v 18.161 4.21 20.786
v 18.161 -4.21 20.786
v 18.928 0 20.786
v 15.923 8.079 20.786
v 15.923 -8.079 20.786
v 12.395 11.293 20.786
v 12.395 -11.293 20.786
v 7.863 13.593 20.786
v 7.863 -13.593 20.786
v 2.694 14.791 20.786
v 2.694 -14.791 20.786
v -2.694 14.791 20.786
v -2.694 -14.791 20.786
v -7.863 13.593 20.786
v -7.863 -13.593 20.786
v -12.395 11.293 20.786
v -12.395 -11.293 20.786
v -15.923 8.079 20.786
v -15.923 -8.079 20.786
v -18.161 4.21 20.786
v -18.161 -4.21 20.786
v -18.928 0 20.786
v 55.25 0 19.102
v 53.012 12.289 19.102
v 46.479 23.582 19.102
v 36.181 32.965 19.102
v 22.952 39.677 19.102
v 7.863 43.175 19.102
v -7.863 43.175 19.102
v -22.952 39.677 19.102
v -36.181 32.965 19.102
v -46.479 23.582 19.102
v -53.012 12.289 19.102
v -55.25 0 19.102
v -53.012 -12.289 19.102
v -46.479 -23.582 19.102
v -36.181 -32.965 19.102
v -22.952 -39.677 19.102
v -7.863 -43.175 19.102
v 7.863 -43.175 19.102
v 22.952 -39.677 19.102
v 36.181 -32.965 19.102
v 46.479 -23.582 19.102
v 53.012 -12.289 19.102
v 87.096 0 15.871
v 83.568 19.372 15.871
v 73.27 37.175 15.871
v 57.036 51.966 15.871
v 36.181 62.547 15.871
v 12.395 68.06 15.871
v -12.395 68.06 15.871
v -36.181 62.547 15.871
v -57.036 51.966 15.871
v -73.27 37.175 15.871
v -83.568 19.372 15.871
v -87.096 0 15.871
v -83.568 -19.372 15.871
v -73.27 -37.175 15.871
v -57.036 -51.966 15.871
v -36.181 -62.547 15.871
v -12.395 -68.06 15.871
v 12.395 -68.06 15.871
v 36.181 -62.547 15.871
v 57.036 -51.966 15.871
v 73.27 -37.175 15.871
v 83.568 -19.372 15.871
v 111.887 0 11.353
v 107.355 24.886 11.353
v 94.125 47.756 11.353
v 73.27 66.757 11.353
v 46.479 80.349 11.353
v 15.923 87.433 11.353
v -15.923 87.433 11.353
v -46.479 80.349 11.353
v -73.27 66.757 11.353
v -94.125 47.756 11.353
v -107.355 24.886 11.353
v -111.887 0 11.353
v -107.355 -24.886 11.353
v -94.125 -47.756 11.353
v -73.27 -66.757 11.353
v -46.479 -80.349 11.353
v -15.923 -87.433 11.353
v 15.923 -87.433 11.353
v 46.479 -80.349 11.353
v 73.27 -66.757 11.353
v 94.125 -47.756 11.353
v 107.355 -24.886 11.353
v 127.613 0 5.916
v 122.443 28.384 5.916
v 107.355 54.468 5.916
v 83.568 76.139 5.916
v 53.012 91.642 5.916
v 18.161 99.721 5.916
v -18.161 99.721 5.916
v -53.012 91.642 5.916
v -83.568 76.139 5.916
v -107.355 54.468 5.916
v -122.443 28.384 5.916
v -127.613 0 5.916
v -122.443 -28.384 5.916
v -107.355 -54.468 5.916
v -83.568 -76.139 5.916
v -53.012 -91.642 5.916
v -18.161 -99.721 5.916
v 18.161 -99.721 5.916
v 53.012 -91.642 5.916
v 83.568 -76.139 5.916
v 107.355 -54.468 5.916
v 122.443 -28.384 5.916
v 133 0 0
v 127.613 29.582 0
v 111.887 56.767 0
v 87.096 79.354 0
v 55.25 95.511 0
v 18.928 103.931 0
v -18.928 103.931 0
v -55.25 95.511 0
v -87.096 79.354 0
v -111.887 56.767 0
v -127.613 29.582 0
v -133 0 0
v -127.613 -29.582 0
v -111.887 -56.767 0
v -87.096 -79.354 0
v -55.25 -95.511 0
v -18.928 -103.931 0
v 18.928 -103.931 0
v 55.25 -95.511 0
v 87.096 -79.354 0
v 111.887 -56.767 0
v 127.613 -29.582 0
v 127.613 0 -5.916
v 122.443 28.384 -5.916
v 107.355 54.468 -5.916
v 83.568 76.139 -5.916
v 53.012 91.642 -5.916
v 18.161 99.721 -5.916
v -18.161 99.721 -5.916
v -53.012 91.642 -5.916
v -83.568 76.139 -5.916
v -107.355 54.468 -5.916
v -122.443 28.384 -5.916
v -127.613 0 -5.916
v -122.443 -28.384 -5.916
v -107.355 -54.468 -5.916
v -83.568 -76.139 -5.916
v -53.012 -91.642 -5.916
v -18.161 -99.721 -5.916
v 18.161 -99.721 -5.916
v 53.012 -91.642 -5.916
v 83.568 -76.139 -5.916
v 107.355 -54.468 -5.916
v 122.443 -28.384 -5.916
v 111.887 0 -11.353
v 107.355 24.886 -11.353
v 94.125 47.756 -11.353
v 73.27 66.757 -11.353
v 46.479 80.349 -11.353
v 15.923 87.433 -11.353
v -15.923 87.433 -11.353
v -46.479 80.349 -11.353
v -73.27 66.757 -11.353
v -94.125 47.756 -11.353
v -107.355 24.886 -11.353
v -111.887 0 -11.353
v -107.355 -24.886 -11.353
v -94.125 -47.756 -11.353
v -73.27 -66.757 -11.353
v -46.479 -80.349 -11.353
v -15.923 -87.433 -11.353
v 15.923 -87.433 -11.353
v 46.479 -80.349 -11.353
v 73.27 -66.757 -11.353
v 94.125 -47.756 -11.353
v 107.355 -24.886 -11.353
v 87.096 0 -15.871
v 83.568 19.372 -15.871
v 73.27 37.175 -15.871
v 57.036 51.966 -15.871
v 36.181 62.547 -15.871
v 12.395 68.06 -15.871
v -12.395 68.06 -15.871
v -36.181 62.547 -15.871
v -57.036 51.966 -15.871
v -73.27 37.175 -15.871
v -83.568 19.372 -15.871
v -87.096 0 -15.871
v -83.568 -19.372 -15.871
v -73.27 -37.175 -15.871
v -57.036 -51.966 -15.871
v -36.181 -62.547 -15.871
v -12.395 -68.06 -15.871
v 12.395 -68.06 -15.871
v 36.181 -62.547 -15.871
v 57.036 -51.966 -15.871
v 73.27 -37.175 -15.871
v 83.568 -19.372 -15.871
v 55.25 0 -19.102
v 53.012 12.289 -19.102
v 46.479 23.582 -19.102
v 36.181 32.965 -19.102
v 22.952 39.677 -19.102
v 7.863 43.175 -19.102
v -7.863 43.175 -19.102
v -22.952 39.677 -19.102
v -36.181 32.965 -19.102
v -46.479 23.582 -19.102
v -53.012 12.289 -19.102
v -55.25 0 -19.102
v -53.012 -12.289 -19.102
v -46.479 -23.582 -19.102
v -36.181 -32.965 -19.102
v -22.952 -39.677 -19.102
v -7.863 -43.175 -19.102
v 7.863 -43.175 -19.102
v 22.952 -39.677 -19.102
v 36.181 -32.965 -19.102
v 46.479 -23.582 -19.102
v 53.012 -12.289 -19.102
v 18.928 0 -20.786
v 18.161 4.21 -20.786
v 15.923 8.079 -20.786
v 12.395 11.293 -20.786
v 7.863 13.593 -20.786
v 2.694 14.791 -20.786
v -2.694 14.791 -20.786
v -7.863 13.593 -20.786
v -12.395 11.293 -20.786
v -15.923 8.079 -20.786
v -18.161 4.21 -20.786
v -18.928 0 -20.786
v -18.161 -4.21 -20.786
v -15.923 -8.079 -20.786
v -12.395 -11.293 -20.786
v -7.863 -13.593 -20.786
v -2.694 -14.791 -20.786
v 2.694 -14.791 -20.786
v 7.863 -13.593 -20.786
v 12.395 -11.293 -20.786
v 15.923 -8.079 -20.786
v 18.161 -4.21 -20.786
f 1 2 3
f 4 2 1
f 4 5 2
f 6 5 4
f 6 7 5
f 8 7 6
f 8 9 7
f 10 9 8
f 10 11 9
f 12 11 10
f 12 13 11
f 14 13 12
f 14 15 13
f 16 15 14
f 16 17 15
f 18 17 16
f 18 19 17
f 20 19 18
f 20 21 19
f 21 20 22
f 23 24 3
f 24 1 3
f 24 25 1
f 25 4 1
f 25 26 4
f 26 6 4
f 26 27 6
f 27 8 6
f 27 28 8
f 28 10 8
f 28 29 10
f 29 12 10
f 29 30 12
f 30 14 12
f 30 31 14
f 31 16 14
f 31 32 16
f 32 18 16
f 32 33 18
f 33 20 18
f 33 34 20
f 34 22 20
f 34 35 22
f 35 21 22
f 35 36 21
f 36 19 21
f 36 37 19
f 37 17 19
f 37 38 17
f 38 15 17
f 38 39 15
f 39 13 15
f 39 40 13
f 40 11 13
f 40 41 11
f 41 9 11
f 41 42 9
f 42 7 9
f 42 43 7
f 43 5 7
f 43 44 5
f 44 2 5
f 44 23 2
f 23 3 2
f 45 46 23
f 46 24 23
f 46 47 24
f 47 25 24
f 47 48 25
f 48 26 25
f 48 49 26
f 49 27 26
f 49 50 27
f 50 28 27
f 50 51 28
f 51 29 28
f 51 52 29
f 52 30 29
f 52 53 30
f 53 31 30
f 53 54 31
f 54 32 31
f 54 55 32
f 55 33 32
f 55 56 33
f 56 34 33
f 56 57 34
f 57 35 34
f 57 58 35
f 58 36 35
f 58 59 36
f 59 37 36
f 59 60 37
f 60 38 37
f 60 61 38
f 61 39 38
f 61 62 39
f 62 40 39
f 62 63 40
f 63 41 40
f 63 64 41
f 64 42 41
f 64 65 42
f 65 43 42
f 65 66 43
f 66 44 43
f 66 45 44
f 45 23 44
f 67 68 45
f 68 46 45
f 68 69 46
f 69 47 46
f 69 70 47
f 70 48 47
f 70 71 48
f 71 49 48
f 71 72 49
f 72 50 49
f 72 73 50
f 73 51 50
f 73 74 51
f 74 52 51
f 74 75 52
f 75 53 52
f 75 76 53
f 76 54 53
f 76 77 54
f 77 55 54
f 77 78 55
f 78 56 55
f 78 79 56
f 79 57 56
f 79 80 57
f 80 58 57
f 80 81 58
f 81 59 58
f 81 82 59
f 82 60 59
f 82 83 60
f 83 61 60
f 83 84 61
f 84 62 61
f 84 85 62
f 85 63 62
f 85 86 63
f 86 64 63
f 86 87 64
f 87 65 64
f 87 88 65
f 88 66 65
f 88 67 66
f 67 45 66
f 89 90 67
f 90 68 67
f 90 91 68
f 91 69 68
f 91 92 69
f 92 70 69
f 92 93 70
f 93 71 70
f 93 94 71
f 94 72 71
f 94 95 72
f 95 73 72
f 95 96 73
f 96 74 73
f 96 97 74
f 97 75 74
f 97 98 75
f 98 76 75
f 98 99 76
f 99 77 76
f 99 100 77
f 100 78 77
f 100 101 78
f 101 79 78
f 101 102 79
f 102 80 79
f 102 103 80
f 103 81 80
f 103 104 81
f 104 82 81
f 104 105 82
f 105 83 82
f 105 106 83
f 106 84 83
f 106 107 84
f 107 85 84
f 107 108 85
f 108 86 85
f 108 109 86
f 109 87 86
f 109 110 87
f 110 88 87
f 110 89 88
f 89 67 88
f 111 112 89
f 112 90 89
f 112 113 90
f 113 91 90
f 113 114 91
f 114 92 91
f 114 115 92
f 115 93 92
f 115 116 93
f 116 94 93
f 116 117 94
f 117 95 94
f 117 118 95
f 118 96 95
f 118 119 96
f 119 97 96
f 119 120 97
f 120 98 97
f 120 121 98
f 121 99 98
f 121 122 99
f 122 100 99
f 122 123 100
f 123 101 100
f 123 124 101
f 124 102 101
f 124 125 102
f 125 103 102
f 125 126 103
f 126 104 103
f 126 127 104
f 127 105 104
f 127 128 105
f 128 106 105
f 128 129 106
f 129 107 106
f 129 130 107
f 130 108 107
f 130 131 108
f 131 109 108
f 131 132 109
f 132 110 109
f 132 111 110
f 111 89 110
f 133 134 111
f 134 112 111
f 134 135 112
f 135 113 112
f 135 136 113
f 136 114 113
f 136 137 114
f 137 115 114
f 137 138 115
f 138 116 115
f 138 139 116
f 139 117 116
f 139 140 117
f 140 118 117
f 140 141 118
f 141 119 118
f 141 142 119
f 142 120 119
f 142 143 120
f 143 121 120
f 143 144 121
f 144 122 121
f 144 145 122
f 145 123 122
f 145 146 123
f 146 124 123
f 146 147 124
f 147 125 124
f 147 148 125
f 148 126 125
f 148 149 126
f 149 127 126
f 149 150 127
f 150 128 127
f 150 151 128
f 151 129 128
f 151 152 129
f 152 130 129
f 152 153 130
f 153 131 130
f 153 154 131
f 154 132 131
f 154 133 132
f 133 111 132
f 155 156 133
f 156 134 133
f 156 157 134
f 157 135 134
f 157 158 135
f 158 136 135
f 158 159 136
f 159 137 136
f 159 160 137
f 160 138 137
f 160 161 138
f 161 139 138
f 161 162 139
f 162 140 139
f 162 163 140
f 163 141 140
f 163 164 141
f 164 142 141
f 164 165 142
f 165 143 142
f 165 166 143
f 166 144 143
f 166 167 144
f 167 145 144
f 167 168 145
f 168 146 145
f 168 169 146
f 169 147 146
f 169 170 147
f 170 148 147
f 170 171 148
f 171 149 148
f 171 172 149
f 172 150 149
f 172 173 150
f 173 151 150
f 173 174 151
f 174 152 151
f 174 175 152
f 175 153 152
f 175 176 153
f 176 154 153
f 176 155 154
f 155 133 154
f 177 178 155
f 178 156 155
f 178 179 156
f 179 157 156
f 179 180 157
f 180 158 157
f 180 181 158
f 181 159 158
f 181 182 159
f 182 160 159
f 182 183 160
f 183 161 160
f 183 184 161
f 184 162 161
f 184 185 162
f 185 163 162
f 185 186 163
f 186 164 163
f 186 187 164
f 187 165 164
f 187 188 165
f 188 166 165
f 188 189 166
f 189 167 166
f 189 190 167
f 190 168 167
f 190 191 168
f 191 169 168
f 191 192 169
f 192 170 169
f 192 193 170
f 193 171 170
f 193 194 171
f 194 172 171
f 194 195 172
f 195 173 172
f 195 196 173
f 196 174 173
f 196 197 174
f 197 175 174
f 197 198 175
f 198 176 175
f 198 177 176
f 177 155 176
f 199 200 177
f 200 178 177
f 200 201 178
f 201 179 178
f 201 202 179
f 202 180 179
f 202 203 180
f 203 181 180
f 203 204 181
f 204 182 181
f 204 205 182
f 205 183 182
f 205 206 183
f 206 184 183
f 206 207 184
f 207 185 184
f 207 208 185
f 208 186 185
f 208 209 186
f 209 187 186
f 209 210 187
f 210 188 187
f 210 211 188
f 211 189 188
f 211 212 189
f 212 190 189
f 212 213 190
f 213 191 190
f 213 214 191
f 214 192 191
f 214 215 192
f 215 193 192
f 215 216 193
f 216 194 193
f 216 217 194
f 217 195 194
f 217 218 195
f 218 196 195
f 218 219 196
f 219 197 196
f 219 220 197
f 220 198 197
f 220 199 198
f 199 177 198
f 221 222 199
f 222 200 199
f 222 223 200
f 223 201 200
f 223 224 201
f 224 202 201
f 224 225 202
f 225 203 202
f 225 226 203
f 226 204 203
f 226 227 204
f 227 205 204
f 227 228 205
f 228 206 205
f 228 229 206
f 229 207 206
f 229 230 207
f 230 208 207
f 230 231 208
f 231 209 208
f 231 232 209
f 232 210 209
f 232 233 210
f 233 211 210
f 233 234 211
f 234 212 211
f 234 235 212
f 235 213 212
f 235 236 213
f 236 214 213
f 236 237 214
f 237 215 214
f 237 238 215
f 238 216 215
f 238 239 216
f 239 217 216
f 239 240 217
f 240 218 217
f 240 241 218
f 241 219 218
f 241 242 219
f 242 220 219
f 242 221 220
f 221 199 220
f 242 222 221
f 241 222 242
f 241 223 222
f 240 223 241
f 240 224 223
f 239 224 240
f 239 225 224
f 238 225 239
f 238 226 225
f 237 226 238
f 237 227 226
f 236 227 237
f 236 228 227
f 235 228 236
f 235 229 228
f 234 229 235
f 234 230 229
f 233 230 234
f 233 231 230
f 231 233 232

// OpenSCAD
// Generated by SolidPython 1.0.1 on 2020-07-29 00:46:54


scale(v = [19, 15, 3]) {
	sphere(r = 7);
}
/***********************************************
*********      SolidPython code:      **********
************************************************
 
# import packages: SolidPython
from solid import *
from solid.utils import *
from itertools import chain, combinations, permutations


class Resize:

    def __init__(self, scad_file):
        self.scad_file = scad_file
        #self.scad_file = import_scad(scad_file)
        # cone/cylinder param:
        self.r1 = 0
        self.r2 = 0
        self.h = 0
        # rectangular prism param:
        self.w = 0
        self.l = 0
        # ellipse param:
        self.r = 0

    # import OpenScad code (file name corresponds to shape)


    # classify shape + parameters
    def assign(self, param1, param2, param3):
        if self.scad_file == 'cone.scad':
            self.r1 = param1
            self.r2 = param2
            self.h = param3
        elif self.scad_file == 'cylinder.scad':
            self.r1 = param1
            self.r2 = param2
            self.h = param3
        elif self.scad_file == 'rectangularPrism.scad':
            self.h = param1
            self.l = param2
            self.w = param3
        else:
            self.r = param1
            self.h = param2

    # resize parameters
    def iterate(self):
        x = range(3, 20, 2)
        i = 1
        if self.scad_file == 'cone.scad':
            tempList = list(permutations(x, 2))
            for temp in tempList:
                param1 = temp[0]
                param2 = temp[1]
                filepath = 'produced_scad_files/' + 'cone' + str(param1) + '_' + str(param2) + '_' + '.scad'
                scad_render_to_file(cylinder(h=param1, r1=param2, r2=0), filepath)

        elif self.scad_file == 'cylinder.scad':
            tempList = list(permutations(x, 3))
            for temp in tempList:
                param1 = temp[0]
                param2 = temp[1]
                filepath = 'produced_scad_files/' + 'cylinder' + str(param1) + '_' + str(param2) + '_' + '.scad'
                scad_render_to_file(cylinder(h=param1, r1=param2, r2=param2), filepath)

        elif self.scad_file == 'rectangularPrism.scad':
            tempList = list(permutations(x, 3))
            for temp in tempList:
                param1 = temp[0]
                param2 = temp[1]
                param3 = temp[2]
                filepath = 'produced_scad_files/' + 'rectangularPrism' + str(param1) + '_' + str(param2) + '_' + str(
                    param3) + '.scad'
                scad_render_to_file(cube(size=(param1, param2, param3)), filepath)

        elif self.scad_file == 'ellipse.scad':
            tempList = list(permutations(x, 4))
            for temp in tempList:
                param1 = temp[0]
                param2 = temp[1]
                param3 = temp[2]
                param4 = temp[3]
                filepath = 'produced_scad_files/' + 'ellipse' + str(param1) + '_' + str(param2) + '_' + str(param3) + '_' + str(param4) + '.scad'
                scad_render_to_file(scale([param1, param2, param3])(sphere(r=param4)), filepath)

    def render_to_scadfile(self):
        scad_render_to_file(scad, 'example.scad') 
 
************************************************/
